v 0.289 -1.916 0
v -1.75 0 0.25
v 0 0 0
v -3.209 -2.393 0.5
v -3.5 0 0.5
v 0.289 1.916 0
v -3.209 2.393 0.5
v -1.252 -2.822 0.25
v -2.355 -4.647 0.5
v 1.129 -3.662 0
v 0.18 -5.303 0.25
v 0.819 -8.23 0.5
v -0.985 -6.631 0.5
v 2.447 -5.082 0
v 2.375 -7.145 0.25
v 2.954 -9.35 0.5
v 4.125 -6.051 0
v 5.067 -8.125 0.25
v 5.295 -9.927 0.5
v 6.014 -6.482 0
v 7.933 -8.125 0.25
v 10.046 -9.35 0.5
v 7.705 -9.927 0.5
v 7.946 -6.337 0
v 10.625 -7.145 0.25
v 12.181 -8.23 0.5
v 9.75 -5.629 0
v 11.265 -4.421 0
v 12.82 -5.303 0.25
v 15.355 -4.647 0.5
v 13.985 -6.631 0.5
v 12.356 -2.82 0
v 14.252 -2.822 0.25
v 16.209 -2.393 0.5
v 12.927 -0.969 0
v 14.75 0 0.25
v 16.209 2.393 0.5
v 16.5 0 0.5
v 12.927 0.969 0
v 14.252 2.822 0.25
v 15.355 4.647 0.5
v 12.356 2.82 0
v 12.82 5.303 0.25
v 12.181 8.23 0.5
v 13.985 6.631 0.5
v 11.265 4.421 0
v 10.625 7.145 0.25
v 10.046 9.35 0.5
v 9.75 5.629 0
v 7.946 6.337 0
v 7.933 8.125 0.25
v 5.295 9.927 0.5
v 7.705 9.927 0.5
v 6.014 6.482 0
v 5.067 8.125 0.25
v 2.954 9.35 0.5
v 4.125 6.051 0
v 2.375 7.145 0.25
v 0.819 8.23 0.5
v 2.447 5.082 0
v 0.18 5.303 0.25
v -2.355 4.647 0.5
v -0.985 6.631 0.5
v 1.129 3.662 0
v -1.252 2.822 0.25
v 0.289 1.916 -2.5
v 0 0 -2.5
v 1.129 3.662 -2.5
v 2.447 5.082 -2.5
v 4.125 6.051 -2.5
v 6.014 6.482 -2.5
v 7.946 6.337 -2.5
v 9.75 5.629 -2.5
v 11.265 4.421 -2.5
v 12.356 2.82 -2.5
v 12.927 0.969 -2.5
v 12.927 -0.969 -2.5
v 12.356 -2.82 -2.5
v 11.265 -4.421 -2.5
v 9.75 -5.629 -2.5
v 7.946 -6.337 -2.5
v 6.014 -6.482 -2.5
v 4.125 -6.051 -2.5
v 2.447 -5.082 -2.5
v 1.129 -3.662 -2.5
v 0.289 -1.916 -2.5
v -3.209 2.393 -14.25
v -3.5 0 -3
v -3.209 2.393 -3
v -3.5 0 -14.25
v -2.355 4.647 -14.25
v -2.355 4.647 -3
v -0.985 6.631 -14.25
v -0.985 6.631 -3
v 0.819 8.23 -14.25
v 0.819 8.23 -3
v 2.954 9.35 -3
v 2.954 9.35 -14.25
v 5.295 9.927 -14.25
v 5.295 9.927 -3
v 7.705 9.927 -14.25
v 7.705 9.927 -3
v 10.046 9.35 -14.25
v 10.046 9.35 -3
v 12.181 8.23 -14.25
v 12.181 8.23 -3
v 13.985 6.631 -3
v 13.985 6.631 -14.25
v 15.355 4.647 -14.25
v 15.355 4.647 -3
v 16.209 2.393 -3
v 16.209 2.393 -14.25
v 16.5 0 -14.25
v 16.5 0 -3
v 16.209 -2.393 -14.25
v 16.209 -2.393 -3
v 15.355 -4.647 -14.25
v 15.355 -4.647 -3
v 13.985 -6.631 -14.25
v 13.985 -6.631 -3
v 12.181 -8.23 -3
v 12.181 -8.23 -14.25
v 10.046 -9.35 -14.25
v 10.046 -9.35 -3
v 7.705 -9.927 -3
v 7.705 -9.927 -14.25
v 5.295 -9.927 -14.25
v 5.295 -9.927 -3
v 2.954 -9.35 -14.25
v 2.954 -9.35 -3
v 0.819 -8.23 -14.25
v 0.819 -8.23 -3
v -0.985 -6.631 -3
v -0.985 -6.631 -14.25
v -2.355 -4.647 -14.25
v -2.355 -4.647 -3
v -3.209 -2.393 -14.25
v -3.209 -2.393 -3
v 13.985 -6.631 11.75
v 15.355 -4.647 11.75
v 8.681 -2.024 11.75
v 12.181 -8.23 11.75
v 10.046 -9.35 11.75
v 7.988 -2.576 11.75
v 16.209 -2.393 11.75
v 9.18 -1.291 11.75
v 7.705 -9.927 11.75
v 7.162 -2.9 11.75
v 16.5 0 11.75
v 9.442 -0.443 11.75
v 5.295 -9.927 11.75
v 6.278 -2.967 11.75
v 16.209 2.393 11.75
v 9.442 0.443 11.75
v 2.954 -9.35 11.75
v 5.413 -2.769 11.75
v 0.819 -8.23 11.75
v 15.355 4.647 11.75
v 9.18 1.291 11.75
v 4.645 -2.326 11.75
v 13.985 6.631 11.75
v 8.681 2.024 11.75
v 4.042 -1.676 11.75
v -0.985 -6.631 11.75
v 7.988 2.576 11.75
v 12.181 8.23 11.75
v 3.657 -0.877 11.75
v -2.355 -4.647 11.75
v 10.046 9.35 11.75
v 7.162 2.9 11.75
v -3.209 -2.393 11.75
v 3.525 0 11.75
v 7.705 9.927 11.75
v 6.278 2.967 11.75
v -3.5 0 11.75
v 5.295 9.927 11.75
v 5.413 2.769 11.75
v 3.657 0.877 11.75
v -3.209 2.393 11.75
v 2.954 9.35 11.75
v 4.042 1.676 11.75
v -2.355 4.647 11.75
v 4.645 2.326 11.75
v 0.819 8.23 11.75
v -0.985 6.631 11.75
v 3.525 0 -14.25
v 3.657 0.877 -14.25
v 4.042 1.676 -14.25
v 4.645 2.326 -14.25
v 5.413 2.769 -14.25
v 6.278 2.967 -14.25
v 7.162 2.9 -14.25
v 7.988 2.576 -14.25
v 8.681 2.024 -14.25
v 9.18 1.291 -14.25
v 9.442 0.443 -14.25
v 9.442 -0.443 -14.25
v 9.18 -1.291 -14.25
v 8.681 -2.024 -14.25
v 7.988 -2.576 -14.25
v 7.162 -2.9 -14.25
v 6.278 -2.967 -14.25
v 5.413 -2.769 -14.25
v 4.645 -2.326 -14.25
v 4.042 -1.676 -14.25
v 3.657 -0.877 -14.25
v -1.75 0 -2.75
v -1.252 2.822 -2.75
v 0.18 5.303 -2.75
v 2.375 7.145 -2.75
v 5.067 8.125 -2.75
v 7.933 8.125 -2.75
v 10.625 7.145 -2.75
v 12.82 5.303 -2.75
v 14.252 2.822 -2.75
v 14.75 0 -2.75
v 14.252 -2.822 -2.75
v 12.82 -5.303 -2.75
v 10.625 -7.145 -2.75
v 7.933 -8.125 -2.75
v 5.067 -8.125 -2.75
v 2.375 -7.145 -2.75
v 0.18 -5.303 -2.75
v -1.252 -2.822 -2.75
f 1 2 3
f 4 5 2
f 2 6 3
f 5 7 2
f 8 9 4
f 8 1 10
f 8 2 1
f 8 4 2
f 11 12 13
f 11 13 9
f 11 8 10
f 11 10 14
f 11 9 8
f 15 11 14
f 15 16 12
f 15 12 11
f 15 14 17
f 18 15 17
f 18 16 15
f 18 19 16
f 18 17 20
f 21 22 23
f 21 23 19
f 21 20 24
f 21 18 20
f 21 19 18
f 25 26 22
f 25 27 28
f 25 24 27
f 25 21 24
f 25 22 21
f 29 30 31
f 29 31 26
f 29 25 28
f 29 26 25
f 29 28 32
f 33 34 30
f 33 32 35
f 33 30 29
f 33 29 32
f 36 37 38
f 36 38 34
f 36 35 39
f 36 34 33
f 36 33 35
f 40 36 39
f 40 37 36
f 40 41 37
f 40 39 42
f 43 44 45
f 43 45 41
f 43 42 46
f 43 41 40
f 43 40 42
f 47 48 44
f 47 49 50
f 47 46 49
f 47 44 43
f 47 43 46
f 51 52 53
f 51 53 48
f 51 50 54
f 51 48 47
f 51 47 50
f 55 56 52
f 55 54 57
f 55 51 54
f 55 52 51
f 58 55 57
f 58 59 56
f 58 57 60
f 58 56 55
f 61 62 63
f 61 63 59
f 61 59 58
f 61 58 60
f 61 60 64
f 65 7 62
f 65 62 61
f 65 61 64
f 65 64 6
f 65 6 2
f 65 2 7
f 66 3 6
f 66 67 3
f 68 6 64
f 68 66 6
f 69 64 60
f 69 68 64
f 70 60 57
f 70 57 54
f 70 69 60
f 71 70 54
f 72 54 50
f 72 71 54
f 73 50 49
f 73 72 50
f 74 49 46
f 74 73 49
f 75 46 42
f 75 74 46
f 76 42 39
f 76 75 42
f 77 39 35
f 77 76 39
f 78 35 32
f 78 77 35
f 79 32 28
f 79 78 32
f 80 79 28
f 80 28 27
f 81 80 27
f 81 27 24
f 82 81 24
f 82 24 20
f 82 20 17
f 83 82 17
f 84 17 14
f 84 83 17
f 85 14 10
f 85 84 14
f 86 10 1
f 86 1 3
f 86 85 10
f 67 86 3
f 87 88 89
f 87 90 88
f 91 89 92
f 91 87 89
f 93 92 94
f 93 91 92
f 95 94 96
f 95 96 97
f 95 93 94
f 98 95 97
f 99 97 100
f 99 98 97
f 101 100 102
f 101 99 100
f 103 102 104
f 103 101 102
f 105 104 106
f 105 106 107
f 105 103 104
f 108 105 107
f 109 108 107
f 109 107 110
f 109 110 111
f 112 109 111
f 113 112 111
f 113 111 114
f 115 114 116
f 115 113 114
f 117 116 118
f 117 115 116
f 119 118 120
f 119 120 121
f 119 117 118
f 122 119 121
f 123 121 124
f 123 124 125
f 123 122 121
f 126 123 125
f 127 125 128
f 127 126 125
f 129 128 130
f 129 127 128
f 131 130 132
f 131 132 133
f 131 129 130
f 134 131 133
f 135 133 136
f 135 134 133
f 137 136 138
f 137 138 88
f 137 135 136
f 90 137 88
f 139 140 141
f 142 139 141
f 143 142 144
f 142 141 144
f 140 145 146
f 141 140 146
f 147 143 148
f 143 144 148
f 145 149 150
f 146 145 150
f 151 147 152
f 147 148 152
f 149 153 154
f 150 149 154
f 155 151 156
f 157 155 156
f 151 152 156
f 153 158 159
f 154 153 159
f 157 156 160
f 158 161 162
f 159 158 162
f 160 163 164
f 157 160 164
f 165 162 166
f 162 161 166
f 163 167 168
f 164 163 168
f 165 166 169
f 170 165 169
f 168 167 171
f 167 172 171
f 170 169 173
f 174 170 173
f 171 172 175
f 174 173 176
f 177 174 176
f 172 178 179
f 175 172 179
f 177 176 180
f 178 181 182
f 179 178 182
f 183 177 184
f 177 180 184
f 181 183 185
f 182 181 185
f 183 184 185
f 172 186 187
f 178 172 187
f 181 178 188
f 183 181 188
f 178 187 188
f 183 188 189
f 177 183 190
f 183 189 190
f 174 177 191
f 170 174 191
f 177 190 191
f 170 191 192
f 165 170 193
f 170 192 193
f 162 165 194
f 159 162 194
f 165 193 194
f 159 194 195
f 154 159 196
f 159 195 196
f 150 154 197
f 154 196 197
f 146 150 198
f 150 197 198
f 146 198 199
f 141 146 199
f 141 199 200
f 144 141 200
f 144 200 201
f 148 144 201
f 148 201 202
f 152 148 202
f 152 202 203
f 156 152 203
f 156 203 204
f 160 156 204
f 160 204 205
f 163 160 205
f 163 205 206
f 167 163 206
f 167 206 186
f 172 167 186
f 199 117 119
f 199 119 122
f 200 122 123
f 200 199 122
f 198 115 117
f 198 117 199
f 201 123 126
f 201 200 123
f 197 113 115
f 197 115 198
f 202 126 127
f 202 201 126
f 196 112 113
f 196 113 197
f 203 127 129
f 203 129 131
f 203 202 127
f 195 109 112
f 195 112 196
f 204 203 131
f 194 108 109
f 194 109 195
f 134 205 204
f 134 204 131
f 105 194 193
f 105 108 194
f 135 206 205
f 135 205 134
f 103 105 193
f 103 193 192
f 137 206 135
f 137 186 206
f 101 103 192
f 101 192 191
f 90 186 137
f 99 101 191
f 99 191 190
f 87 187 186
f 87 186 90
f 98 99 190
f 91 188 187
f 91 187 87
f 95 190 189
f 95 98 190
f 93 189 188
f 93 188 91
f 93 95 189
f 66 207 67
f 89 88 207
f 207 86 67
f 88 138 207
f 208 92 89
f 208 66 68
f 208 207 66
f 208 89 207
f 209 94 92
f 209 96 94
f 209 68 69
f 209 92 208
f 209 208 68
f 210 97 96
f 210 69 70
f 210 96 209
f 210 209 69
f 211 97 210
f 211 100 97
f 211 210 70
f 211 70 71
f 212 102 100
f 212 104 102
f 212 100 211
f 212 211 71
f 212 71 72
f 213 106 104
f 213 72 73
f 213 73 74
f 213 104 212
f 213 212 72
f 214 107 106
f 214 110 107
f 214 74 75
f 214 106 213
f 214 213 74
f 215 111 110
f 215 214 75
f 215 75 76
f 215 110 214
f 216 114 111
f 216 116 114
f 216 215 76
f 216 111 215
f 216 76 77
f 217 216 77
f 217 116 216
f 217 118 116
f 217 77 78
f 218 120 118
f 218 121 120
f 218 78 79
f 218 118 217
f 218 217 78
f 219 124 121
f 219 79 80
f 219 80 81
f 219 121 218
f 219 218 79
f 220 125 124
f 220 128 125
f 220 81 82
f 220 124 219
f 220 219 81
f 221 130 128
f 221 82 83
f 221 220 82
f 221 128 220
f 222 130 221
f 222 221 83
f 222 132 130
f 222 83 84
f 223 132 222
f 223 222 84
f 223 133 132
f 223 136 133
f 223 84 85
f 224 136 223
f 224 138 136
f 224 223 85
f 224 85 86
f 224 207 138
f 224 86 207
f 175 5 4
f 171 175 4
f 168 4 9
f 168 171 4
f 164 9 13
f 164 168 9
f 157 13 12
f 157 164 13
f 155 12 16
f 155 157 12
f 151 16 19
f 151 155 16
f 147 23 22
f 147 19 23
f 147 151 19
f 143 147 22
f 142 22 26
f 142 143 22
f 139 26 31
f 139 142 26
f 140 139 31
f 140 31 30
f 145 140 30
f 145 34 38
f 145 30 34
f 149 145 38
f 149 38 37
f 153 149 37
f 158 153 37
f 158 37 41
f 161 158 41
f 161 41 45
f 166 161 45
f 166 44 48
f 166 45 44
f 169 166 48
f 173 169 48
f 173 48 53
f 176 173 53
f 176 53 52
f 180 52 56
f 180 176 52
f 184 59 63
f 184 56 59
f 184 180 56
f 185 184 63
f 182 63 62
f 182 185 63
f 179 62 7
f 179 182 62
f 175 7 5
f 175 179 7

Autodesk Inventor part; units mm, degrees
ref_plane "YZ Plane" through (0, 0, 0) normal (1, 0, 0) x (0, 1, 0)
ref_plane "XZ Plane" through (0, 0, 0) normal (0, 1, 0) x (-1, 0, 0)
ref_plane "XY Plane" through (0, 0, 0) normal (0, 0, 1) x (1, 0, 0)
sketch "Sketch1" plane through (0, 0, 0) normal (0, 1, 0) x (-1, 0, 0)
  line L0 (0, 0) -> (0, -2.5)
  line L1 (3.5, 0.5) -> (0, 0)
  line L2 (3.5, -3) -> (0, -2.5)
  line L3 (3.5, -3) -> (3.5, -14.25)
  line L4 (3.5, -14.25) -> (-6.5, -14.25)
  line L5 (3.5, 0.5) -> (3.5, 11.75)
  line L6 (3.5, 11.75) -> (-6.5, 11.75)
  line L7 (-6.5, 11.75) -> (-6.5, -14.25)
  dimension "d0" = 2.5
  dimension "d6" = 3.5
  dimension "d9" = 11.25
  dimension "d11" = 10
  dimension "d12" = 90
  dimension "d13" = 11.25
  dimension "d15" = 10
  dimension "d16" = 90
  dimension "d17" = 3.5
  dimension "d18" = 11.75
revolve "Revolution1" add sketch "Sketch1" angle 360 about axis through (6.5, 0, 11.75) along (0, 0, -1)
sketch "Sketch2" plane through (6.5, 0, -14.25) normal (0, 0, -1) x (-1, 0, 0)
  circle A0 centre (0, 0) radius 2.975
  circle A1 centre (0, 0) radius 10 projected
  point P0 (6.5, 0)
  dimension "d20" = 5.95
extrude "Extrusion1" cut sketch "Sketch2" against normal blind 26 contours A0
properties part number "roller" material "ABS Plastic"
